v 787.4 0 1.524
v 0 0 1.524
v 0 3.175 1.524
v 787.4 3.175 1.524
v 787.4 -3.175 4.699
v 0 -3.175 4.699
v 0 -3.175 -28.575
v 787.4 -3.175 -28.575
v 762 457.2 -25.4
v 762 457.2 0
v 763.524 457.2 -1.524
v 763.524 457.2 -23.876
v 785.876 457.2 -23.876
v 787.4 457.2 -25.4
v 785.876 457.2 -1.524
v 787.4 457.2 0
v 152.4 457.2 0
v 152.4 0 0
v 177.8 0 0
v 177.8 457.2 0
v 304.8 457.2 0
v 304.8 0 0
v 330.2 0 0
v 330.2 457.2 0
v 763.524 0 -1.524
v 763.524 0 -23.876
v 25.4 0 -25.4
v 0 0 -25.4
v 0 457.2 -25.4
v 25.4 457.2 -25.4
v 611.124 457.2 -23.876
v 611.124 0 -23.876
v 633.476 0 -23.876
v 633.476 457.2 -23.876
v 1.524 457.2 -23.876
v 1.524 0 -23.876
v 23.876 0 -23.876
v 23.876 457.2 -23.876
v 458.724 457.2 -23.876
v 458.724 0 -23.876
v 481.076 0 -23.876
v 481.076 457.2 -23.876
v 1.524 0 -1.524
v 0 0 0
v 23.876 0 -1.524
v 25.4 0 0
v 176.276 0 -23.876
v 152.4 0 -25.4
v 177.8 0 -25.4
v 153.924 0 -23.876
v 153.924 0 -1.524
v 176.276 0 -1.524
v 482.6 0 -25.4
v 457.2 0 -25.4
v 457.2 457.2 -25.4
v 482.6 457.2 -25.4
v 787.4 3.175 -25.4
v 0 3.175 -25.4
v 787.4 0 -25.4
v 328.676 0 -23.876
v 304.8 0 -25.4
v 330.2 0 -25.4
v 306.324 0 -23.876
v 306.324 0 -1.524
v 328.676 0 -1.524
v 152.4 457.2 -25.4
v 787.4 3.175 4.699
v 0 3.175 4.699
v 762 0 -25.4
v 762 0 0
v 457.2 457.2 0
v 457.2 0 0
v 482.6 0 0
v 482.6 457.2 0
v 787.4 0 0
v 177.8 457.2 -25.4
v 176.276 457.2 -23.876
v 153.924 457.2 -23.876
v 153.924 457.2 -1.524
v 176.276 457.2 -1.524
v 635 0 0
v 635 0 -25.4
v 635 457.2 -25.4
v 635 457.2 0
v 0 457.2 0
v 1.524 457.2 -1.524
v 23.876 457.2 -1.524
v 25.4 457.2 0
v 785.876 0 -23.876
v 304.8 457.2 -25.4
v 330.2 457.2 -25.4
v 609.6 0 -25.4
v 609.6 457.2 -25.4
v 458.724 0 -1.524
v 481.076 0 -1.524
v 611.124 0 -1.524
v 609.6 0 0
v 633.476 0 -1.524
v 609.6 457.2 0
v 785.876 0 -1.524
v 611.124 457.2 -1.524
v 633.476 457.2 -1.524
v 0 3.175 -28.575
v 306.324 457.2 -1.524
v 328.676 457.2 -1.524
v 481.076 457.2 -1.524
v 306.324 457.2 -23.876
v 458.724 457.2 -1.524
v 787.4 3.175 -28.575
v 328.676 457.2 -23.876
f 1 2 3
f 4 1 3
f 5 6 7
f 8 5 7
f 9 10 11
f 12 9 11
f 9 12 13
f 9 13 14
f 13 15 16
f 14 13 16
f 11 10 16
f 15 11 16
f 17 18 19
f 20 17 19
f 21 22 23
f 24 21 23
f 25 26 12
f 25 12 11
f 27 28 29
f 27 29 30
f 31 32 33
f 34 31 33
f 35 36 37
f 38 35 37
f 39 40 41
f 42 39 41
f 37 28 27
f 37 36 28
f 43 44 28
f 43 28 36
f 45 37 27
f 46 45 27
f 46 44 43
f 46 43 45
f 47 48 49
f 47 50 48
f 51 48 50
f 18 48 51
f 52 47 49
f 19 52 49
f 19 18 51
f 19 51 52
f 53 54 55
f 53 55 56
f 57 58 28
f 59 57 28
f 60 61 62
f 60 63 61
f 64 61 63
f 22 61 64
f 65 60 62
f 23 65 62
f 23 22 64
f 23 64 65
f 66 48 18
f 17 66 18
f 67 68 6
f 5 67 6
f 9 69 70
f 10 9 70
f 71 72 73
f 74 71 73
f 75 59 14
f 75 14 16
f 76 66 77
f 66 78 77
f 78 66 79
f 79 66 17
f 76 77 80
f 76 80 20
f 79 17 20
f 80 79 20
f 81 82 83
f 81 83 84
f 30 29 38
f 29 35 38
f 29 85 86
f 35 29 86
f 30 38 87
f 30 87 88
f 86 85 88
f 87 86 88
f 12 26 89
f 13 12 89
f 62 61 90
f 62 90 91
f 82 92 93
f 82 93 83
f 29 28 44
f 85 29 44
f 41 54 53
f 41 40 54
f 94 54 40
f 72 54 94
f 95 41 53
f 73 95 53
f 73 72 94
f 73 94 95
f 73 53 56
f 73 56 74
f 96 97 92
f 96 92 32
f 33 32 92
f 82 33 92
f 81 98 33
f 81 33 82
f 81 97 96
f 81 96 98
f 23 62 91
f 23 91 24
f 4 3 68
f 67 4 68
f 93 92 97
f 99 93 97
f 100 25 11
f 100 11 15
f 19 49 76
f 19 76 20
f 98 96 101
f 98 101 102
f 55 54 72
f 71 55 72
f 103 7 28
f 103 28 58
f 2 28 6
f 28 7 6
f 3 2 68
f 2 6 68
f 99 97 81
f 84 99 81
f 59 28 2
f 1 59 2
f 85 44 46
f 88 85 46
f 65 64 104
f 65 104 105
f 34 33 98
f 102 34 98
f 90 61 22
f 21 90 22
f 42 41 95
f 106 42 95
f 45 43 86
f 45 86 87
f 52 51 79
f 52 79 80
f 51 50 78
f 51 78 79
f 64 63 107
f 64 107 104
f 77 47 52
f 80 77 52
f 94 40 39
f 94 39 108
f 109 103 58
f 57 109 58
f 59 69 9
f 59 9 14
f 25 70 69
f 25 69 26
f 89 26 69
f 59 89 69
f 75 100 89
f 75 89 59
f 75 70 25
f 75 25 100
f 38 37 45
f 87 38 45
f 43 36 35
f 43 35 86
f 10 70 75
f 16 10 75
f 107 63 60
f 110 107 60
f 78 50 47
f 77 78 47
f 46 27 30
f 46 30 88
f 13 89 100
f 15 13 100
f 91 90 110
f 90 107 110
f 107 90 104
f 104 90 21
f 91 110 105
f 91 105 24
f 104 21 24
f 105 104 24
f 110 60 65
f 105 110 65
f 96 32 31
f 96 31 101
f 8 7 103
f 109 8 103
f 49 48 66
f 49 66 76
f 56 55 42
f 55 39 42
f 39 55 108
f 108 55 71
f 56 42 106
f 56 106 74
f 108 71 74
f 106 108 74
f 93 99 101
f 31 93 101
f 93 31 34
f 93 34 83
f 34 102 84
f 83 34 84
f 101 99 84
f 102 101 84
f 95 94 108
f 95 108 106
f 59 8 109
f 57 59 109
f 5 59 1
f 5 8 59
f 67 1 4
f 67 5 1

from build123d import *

# Parameters (mm, degrees)
F0_W     = 25.4
F0_H     = 25.4
F0_W_2   = 22.352
F0_H_2   = 22.352
F1_DEPTH = 457.2
F3_DEPTH = 787.4


with BuildPart() as f1:
    # F0 (on Front) → F1 (new body)
    with BuildSketch(Plane.XZ):
        with Locations((12.7, -12.7)):
            Rectangle(F0_W, F0_H)
        with Locations((12.7, -12.7)):
            Rectangle(F0_W_2, F0_H_2, mode=Mode.SUBTRACT)
        with Locations((165.1, -12.7)):
            Rectangle(F0_W, F0_H)
        with Locations((165.1, -12.7)):
            Rectangle(F0_W_2, F0_H_2, mode=Mode.SUBTRACT)
        with Locations((317.5, -12.7)):
            Rectangle(F0_W, F0_H)
        with Locations((317.5, -12.7)):
            Rectangle(F0_W_2, F0_H_2, mode=Mode.SUBTRACT)
        with Locations((469.9, -12.7)):
            Rectangle(F0_W, F0_H)
        with Locations((469.9, -12.7)):
            Rectangle(F0_W_2, F0_H_2, mode=Mode.SUBTRACT)
        with Locations((622.3, -12.7)):
            Rectangle(F0_W, F0_H)
        with Locations((622.3, -12.7)):
            Rectangle(F0_W_2, F0_H_2, mode=Mode.SUBTRACT)
        with Locations((774.7, -12.7)):
            Rectangle(F0_W, F0_H)
        with Locations((774.7, -12.7)):
            Rectangle(F0_W_2, F0_H_2, mode=Mode.SUBTRACT)
    extrude(amount=-F1_DEPTH)


with BuildPart() as f3:
    # F2 (on Right) → F3 (new body)
    with BuildSketch(Plane.YZ):
        Polygon((3.175, 1.524), (3.175, 4.699), (-3.175, 4.699), (-3.175, -28.575), (3.175, -28.575), (3.175, -25.4), (0, -25.4), (0, 1.524), align=None)
    extrude(amount=F3_DEPTH)


solid = Compound([f1.part, f3.part])
